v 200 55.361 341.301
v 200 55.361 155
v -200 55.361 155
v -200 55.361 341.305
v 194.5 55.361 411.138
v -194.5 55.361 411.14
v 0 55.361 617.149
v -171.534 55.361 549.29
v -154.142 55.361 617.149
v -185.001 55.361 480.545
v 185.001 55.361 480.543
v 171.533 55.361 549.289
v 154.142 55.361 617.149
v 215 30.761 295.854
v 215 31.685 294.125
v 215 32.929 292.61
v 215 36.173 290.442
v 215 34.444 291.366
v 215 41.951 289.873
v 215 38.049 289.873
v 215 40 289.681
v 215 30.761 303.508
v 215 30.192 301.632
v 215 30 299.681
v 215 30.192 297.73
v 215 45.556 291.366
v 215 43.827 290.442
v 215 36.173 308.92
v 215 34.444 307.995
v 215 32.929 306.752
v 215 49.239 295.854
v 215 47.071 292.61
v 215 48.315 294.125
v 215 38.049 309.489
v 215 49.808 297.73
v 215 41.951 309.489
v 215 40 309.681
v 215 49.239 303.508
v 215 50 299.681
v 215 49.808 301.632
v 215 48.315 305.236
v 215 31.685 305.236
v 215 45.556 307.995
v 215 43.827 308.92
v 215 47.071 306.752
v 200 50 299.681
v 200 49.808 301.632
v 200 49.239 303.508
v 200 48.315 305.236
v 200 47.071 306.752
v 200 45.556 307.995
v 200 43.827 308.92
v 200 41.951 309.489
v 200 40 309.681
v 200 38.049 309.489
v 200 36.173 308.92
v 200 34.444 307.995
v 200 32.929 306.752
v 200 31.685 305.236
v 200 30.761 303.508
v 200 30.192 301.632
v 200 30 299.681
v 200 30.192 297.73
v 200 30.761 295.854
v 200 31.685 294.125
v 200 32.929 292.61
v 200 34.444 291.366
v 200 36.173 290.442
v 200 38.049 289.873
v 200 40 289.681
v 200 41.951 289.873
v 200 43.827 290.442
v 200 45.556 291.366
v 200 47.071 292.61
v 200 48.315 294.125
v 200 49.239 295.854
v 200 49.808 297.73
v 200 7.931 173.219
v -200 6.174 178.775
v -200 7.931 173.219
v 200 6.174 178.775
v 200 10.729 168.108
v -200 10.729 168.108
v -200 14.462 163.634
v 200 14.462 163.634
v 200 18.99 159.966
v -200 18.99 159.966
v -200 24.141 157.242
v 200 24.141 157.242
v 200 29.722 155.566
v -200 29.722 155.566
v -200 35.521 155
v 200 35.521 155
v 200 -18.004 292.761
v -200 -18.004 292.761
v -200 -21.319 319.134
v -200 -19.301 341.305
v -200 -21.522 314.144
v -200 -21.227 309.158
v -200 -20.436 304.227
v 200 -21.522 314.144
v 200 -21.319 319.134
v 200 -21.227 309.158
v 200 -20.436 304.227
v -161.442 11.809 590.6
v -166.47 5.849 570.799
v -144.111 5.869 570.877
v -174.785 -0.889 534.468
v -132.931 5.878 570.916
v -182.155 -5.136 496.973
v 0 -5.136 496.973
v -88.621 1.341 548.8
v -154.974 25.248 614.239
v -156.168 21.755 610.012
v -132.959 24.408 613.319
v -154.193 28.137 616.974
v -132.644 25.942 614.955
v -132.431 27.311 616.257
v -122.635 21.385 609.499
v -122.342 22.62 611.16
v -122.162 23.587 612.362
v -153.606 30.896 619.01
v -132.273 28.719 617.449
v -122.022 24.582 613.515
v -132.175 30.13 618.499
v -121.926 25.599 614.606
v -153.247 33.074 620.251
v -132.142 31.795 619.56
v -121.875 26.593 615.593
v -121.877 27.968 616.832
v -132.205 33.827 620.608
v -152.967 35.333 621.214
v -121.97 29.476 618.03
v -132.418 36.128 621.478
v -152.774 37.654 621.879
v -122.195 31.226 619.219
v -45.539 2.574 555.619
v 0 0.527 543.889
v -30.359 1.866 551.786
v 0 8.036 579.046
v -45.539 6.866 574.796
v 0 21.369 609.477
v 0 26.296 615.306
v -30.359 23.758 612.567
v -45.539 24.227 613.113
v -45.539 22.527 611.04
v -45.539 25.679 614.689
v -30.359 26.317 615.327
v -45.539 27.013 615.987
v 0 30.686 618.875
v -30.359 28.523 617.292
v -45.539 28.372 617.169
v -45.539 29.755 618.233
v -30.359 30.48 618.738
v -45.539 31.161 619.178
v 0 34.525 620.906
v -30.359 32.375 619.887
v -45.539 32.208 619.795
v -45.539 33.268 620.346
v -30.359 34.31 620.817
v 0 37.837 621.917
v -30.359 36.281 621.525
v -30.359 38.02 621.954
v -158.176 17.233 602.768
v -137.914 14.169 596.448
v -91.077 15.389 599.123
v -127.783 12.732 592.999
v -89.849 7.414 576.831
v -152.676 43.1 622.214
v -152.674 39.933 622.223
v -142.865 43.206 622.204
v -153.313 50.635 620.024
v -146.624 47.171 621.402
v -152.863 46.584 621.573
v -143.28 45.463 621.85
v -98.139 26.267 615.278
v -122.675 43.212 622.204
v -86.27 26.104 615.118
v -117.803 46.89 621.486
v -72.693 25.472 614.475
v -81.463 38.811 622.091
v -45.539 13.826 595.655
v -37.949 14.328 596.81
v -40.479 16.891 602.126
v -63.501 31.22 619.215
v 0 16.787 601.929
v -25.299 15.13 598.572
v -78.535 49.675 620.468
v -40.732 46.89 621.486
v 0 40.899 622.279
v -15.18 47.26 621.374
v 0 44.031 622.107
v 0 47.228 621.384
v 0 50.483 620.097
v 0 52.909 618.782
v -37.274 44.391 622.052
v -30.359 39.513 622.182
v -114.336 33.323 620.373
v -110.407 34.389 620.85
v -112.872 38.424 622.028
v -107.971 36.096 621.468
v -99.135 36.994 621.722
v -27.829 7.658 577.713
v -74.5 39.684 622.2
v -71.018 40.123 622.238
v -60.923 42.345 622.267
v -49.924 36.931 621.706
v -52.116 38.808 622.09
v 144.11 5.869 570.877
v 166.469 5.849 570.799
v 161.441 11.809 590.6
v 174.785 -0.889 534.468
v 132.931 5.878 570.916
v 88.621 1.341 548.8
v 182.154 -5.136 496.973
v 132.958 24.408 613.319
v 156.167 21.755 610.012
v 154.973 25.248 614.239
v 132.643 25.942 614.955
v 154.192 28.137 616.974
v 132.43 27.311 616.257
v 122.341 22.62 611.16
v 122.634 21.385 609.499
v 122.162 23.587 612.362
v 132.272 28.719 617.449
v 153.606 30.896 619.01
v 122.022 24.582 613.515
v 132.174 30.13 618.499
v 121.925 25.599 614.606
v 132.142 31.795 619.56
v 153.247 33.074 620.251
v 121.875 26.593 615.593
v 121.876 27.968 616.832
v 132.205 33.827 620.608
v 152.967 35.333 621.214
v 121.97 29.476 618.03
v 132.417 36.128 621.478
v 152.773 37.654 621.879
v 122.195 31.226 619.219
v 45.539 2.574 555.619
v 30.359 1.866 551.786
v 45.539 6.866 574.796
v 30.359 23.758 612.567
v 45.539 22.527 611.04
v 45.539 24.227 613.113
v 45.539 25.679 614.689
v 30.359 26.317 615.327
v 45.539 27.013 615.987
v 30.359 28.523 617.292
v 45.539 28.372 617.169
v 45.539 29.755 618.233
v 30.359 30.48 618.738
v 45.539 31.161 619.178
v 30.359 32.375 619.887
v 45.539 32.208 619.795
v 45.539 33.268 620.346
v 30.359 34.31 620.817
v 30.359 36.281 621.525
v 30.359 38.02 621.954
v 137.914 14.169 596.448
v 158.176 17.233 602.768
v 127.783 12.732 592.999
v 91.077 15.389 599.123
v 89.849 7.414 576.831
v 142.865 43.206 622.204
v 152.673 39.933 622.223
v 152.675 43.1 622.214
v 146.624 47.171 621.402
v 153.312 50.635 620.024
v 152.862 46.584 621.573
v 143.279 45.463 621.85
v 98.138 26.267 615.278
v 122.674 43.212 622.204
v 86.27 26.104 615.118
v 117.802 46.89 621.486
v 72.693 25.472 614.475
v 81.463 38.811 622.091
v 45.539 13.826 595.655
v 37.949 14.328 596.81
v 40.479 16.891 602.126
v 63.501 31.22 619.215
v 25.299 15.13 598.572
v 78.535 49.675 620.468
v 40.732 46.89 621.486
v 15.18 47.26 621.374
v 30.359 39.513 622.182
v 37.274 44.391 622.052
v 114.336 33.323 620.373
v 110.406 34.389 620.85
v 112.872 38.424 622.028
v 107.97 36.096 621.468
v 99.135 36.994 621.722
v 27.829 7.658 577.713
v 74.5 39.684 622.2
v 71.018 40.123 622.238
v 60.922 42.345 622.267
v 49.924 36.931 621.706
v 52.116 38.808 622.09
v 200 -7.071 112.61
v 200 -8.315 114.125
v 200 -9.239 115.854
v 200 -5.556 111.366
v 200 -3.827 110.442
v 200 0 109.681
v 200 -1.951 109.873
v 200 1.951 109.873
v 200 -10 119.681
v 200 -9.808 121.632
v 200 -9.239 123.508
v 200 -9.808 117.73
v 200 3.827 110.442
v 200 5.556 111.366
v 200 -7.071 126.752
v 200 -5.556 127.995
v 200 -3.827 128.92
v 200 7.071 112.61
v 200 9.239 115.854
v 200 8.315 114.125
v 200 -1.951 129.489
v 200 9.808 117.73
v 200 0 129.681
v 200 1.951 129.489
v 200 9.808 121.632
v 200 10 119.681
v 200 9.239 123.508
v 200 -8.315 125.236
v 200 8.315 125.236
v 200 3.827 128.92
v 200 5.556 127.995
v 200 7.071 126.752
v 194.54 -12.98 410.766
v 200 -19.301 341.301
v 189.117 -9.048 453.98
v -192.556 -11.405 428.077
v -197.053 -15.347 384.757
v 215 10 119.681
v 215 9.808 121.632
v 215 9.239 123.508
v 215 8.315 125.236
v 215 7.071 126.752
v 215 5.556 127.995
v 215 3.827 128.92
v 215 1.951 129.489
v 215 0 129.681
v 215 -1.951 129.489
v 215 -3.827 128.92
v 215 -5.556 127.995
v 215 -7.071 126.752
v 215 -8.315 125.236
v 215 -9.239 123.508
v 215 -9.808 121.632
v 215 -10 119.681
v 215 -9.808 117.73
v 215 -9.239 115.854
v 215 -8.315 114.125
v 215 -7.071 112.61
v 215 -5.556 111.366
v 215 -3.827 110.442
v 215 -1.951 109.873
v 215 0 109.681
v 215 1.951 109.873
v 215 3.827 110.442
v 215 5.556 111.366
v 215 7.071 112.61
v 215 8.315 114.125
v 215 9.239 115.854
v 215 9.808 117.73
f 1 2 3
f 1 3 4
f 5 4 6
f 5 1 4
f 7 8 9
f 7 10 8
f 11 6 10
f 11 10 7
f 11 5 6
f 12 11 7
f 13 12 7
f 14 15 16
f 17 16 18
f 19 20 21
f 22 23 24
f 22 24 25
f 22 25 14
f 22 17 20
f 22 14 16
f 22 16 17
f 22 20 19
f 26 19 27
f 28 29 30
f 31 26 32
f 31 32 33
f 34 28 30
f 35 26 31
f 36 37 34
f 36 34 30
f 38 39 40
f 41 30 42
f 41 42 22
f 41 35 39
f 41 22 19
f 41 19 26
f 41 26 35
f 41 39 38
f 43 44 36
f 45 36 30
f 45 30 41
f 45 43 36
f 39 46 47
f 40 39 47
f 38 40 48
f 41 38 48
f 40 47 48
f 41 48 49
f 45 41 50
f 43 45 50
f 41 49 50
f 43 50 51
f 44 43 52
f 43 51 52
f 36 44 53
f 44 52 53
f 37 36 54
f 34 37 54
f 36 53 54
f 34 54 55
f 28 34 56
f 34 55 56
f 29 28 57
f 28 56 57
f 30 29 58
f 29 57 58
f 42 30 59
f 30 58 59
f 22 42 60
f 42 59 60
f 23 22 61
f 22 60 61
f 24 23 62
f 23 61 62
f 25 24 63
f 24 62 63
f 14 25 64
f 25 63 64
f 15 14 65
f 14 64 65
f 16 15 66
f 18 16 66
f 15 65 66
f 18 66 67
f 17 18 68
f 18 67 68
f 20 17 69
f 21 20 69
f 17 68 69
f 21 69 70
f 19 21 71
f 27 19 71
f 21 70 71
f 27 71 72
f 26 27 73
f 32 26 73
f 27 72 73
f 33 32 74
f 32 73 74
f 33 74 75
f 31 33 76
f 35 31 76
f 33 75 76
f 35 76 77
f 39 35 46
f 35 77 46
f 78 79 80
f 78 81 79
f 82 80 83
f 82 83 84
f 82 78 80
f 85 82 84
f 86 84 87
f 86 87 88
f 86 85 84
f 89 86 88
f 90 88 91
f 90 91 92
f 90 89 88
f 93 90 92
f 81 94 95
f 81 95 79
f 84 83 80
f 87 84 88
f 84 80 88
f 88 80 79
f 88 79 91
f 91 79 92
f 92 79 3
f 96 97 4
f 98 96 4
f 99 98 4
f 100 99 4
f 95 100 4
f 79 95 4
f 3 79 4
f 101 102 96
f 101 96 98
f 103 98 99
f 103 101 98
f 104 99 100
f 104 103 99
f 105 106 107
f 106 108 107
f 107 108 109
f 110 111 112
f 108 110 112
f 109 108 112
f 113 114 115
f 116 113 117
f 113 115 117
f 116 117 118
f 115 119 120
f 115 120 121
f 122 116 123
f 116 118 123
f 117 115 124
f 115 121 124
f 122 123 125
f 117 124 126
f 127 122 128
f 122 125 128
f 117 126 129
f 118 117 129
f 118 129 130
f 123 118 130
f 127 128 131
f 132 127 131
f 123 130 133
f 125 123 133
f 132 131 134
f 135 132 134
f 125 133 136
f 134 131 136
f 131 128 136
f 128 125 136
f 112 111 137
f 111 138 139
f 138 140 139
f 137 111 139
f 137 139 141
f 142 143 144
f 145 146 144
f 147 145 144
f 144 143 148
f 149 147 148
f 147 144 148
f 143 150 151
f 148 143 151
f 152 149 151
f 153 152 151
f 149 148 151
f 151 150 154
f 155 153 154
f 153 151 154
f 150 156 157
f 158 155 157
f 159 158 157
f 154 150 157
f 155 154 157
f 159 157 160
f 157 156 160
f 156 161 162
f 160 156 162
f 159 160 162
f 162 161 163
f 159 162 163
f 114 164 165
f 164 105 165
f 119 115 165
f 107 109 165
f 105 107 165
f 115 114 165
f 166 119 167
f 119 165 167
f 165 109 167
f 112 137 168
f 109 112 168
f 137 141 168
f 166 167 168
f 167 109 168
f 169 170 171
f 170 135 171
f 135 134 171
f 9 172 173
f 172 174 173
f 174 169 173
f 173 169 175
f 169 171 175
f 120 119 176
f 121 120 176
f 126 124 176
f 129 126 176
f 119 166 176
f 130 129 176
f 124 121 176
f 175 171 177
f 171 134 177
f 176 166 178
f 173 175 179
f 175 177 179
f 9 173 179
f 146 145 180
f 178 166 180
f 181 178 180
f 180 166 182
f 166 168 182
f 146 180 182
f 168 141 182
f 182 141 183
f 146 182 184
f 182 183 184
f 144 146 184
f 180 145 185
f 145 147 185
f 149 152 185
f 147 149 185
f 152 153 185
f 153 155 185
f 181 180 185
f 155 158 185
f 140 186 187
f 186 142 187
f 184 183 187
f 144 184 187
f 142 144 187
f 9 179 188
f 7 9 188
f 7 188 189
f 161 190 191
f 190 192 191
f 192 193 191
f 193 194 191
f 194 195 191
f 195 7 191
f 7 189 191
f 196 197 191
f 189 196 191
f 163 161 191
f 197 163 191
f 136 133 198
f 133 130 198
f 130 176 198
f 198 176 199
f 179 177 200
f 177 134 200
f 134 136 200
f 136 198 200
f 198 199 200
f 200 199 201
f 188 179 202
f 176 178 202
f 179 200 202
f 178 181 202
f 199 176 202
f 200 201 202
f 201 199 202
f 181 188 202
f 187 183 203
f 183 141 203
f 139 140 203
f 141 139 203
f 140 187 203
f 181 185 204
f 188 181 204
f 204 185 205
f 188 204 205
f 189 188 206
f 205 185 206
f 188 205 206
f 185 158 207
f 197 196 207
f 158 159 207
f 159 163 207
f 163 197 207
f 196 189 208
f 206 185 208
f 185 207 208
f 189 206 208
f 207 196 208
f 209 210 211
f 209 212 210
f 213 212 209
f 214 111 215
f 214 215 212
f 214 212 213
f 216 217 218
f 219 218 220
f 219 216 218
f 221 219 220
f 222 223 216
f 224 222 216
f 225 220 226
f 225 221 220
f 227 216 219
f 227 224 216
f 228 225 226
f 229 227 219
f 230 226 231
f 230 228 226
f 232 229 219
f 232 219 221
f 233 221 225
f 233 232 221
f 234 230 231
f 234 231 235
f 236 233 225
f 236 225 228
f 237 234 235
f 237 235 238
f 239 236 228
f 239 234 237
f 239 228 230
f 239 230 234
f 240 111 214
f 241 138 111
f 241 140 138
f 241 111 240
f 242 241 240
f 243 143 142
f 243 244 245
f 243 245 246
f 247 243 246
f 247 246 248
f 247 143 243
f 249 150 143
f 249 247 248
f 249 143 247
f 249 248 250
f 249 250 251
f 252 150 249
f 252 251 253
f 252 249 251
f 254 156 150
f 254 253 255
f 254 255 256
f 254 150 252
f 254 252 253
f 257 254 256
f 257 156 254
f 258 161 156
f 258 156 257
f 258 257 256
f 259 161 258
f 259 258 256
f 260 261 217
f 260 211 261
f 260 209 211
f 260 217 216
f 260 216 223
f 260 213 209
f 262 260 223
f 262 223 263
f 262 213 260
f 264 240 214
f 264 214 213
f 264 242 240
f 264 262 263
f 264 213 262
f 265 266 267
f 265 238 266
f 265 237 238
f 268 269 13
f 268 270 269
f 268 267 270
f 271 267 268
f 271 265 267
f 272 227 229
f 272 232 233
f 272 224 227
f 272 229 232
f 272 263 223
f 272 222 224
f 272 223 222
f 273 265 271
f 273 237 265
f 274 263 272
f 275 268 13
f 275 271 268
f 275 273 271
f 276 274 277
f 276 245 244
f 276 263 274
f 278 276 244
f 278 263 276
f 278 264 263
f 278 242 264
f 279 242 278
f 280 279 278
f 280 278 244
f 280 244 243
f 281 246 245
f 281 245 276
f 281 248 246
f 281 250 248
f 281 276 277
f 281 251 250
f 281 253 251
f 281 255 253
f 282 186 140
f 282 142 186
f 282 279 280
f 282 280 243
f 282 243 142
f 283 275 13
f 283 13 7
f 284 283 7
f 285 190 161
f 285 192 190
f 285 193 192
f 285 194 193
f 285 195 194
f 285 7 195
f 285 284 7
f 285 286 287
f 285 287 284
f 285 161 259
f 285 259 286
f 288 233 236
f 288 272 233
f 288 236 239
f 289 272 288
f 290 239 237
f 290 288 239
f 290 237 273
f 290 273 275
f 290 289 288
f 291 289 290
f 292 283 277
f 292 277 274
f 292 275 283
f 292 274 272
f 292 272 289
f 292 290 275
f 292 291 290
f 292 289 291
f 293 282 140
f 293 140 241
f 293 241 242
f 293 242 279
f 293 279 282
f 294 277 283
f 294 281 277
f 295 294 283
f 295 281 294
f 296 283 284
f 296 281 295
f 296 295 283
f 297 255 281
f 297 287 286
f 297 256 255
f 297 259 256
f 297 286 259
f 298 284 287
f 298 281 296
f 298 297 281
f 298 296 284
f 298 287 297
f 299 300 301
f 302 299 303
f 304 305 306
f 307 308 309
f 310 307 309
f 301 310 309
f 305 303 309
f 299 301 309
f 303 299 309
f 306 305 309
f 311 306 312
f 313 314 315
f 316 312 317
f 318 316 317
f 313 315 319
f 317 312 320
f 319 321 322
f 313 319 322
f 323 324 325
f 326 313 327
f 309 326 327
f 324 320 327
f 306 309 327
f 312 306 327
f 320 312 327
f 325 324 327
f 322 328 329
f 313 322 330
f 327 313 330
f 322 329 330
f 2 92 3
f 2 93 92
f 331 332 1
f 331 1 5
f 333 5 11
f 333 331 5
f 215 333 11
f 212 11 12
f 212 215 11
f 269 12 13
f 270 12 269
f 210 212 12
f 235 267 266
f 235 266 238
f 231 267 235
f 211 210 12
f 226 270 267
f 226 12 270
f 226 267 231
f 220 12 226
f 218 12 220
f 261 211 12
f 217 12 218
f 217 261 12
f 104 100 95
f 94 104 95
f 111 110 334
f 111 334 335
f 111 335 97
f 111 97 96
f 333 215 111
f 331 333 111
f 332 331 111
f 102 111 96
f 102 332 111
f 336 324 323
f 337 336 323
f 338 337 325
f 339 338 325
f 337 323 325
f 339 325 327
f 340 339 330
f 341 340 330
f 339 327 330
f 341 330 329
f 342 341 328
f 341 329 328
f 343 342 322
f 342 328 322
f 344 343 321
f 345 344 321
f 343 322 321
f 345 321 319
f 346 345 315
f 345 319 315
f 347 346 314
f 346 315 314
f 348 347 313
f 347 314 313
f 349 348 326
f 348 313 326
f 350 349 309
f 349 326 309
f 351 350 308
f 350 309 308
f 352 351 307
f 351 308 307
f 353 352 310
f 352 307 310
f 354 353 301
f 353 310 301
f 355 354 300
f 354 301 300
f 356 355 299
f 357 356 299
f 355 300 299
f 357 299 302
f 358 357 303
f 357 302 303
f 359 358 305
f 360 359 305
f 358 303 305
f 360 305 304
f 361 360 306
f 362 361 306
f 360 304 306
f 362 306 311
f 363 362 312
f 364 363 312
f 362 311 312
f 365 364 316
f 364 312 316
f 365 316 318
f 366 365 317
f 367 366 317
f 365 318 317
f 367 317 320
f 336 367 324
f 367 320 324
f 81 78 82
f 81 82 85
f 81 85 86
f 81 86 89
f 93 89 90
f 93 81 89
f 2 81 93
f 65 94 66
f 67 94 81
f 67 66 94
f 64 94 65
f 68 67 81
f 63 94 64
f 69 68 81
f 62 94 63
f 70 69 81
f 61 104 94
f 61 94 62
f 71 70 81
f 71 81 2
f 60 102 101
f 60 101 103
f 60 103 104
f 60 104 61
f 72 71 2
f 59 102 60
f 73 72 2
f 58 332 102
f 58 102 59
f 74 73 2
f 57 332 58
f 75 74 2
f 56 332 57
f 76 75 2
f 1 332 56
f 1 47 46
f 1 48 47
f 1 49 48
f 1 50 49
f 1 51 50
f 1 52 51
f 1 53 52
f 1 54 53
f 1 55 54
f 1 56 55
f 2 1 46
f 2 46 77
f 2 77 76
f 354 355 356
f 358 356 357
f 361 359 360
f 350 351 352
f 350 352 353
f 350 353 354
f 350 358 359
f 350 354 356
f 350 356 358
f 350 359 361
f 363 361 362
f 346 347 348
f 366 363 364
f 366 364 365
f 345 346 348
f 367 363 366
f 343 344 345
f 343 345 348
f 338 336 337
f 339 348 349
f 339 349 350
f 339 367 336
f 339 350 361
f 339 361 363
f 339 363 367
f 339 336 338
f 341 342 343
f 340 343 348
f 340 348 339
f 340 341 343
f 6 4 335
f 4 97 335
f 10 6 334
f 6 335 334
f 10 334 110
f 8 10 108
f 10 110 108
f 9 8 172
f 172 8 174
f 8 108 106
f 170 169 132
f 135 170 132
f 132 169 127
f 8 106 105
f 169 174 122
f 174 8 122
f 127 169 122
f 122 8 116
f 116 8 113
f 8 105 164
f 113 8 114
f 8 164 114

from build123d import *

# Parameters (mm, degrees)
F1_DEPTH = 200
F4_DEPTH = 100
F2_R     = 10
F5_DEPTH = 15


# Not quite as in the source:
# - a feature of the source that left no trace in its solid (it failed there, or was rolled back) is left out
# - a pattern or mirror of a feature is missing from the dataset's text; its kind, count and spacing are read off the source's solid
# - a feature names something its author has since deleted; it is built from what else it names


with BuildPart() as f1:
    # F0 (on Right) → F1 (new body, symmetric)
    with BuildSketch(Plane.YZ):
        with BuildLine():
            Line((55.3607484261, 155), (55.3607484261, 617.148949861))
            add(Edge.make_bspline(
                [(-5.1356334681, 496.9733605758), (-1.2527495457, 539.6434441922), (10.2970207059, 611.4394103819), (39.6879700651, 628.5664346662), (55.3607484261, 617.148949861)],
                knots=[0.7199137006, 0.7199137006, 0.7199137006, 0.7199137006, 0.8642094186, 0.999917509, 0.999917509, 0.999917509, 0.999917509], degree=3))
            add(Edge.make_bspline(
                [(-18.0039532914, 292.7610744649), (-17.7275211213, 295.6500029476), (-12.1238736433, 356.7123411708), (-10.7984274846, 434.7433534423), (-5.1356334681, 496.9733605758)],
                knots=[0.4988819934, 0.4988819934, 0.4988819934, 0.4988819934, 0.5094729702, 0.7199137006, 0.7199137006, 0.7199137006, 0.7199137006], degree=3))
            Line((-18.0039532914, 292.7610744649), (6.1743674758, 178.7750072777))
            ThreePointArc((6.1743674758, 178.7750072777), (16.6368991944, 161.6895969397), (35.5214195528, 155))
            Line((35.5214195528, 155), (55.3607484261, 155))
        make_face()
        with BuildLine():
            add(Edge.make_bspline(
                [(-18.0039532914, 292.7610744649), (-17.7275211213, 295.6500029476), (-12.1238736433, 356.7123411708), (-10.7984274846, 434.7433534423), (-5.1356334681, 496.9733605758)],
                knots=[0.4988819934, 0.4988819934, 0.4988819934, 0.4988819934, 0.5094729702, 0.7199137006, 0.7199137006, 0.7199137006, 0.7199137006], degree=3))
            Line((-5.1356334681, 496.9733605758), (-21.3186630339, 319.1335800048))
            ThreePointArc((-21.3186630339, 319.1335800048), (-21.4370021949, 311.6473714943), (-20.436154657, 304.2274236355))
            Line((-20.436154657, 304.2274236355), (-18.0039532914, 292.7610744649))
        make_face()
    extrude(amount=F1_DEPTH, both=True)

    # F3 (on Front) → F4 (cut, symmetric)
    with BuildSketch(Plane.XZ):
        with BuildLine():
            ThreePointArc((-200.4893869162, 330.5467367172), (-184.2445033895, 485.0446179169), (-148.4963000619, 636.2251639366))
            Line((-148.4963000619, 636.2251639366), (-242.7955716848, 636.2251639366))
            Line((-242.7955716848, 636.2251639366), (-242.7955716848, 330.5467367172))
            Line((-242.7955716848, 330.5467367172), (-200.4893869162, 330.5467367172))
        make_face()
    f4 = extrude(amount=F4_DEPTH, both=True, mode=Mode.SUBTRACT)

    # F4_copies: F4 across plane
    add(f4.mirror(Plane(origin=(0.000242, 0, 0), x_dir=(-1e-06, 0, 1), z_dir=(1, 0, 1e-06))), mode=Mode.SUBTRACT)

    # F2 (on face) → F5 (join)
    with BuildSketch(Plane.YZ.offset(200)):
        with Locations((40, 299.6807744877)):
            Circle(F2_R)
    extrude(amount=F5_DEPTH)


with BuildPart() as f5:
    # F2 (on face) → F5, piece 2 (new body)
    with BuildSketch(Plane.YZ.offset(200)):
        with Locations((0, 119.6807744877)):
            Circle(F2_R)
    extrude(amount=F5_DEPTH)


solid = Compound([f1.part, f5.part])
